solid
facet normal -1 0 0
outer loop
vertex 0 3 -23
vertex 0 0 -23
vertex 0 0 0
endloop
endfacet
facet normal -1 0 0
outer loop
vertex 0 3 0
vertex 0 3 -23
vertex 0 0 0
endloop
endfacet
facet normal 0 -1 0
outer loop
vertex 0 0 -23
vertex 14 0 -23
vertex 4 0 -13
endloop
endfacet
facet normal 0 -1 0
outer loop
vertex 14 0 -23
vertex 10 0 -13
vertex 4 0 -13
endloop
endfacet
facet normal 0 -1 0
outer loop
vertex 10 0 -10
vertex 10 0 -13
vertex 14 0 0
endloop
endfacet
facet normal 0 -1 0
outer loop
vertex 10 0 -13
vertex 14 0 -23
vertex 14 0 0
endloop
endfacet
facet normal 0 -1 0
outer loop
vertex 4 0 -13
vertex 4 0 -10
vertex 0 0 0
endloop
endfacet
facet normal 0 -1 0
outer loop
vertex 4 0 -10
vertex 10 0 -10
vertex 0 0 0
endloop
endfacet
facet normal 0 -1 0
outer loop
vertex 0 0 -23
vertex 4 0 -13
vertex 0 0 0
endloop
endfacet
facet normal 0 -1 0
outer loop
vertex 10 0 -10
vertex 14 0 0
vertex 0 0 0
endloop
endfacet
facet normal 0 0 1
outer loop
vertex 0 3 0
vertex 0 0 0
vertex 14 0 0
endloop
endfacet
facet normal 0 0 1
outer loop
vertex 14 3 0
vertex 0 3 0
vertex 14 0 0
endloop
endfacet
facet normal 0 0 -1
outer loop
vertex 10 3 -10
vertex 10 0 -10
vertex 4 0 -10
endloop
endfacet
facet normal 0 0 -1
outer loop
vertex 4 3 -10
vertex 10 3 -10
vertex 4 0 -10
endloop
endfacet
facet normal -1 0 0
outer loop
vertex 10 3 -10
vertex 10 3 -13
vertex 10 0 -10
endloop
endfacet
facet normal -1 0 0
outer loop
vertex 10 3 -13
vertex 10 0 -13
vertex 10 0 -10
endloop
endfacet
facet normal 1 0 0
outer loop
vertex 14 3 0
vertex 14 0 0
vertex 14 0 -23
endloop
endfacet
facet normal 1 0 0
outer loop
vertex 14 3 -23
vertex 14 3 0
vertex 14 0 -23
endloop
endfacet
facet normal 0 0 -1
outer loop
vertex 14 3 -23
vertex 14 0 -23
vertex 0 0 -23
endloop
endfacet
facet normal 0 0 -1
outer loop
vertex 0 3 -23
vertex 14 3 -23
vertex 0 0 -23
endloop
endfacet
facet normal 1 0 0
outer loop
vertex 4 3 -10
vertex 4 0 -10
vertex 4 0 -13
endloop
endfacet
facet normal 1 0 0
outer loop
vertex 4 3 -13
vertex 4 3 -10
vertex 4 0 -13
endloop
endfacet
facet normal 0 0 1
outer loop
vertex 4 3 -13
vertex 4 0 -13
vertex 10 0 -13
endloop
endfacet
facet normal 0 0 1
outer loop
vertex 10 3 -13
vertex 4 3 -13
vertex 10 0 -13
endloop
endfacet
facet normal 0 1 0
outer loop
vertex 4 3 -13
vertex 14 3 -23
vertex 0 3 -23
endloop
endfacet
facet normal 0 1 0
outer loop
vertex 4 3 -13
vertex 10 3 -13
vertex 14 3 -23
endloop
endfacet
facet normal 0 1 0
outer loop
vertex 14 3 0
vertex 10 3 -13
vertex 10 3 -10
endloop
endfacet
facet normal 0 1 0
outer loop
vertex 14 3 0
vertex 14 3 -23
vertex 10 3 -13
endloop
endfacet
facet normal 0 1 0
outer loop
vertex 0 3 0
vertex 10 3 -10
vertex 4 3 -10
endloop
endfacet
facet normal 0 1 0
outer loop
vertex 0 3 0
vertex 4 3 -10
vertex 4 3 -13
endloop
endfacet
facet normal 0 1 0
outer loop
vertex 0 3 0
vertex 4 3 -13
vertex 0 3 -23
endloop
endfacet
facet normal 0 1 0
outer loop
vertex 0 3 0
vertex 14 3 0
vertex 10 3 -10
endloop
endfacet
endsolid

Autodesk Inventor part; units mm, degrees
ref_plane "YZ Plane" through (0, 0, 0) normal (1, 0, 0) x (0, 1, 0)
ref_plane "XZ Plane" through (0, 0, 0) normal (0, 1, 0) x (-1, 0, 0)
ref_plane "XY Plane" through (0, 0, 0) normal (0, 0, 1) x (1, 0, 0)
sketch "Sketch1" plane through (0, 0, 0) normal (0, 0, 1) x (1, 0, 0)
  point P0 (0, 0)
sketch "Sketch2" plane through (0, 0, 0) normal (0, 1, 0) x (-1, 0, 0)
  line L0 (0, 0) -> (-14, 0)
  line L1 (-14, 0) -> (-14, -23)
  line L2 (-14, -23) -> (0, -23)
  line L3 (0, -23) -> (0, 0)
  line L4 (-4, -13) -> (-10, -13)
  line L5 (-10, -13) -> (-10, -10)
  line L6 (-10, -10) -> (-4, -10)
  line L7 (-4, -10) -> (-4, -13)
  dimension "d0" = 14
  dimension "d1" = 23
  dimension "d2" = 6
  dimension "d3" = 3
  dimension "d4" = 10
  dimension "d5" = 4
extrude "Extrusion1" add sketch "Sketch2" along normal blind 3
properties part number "OpenROV 2_2 Horizontal Ducting Brace"
